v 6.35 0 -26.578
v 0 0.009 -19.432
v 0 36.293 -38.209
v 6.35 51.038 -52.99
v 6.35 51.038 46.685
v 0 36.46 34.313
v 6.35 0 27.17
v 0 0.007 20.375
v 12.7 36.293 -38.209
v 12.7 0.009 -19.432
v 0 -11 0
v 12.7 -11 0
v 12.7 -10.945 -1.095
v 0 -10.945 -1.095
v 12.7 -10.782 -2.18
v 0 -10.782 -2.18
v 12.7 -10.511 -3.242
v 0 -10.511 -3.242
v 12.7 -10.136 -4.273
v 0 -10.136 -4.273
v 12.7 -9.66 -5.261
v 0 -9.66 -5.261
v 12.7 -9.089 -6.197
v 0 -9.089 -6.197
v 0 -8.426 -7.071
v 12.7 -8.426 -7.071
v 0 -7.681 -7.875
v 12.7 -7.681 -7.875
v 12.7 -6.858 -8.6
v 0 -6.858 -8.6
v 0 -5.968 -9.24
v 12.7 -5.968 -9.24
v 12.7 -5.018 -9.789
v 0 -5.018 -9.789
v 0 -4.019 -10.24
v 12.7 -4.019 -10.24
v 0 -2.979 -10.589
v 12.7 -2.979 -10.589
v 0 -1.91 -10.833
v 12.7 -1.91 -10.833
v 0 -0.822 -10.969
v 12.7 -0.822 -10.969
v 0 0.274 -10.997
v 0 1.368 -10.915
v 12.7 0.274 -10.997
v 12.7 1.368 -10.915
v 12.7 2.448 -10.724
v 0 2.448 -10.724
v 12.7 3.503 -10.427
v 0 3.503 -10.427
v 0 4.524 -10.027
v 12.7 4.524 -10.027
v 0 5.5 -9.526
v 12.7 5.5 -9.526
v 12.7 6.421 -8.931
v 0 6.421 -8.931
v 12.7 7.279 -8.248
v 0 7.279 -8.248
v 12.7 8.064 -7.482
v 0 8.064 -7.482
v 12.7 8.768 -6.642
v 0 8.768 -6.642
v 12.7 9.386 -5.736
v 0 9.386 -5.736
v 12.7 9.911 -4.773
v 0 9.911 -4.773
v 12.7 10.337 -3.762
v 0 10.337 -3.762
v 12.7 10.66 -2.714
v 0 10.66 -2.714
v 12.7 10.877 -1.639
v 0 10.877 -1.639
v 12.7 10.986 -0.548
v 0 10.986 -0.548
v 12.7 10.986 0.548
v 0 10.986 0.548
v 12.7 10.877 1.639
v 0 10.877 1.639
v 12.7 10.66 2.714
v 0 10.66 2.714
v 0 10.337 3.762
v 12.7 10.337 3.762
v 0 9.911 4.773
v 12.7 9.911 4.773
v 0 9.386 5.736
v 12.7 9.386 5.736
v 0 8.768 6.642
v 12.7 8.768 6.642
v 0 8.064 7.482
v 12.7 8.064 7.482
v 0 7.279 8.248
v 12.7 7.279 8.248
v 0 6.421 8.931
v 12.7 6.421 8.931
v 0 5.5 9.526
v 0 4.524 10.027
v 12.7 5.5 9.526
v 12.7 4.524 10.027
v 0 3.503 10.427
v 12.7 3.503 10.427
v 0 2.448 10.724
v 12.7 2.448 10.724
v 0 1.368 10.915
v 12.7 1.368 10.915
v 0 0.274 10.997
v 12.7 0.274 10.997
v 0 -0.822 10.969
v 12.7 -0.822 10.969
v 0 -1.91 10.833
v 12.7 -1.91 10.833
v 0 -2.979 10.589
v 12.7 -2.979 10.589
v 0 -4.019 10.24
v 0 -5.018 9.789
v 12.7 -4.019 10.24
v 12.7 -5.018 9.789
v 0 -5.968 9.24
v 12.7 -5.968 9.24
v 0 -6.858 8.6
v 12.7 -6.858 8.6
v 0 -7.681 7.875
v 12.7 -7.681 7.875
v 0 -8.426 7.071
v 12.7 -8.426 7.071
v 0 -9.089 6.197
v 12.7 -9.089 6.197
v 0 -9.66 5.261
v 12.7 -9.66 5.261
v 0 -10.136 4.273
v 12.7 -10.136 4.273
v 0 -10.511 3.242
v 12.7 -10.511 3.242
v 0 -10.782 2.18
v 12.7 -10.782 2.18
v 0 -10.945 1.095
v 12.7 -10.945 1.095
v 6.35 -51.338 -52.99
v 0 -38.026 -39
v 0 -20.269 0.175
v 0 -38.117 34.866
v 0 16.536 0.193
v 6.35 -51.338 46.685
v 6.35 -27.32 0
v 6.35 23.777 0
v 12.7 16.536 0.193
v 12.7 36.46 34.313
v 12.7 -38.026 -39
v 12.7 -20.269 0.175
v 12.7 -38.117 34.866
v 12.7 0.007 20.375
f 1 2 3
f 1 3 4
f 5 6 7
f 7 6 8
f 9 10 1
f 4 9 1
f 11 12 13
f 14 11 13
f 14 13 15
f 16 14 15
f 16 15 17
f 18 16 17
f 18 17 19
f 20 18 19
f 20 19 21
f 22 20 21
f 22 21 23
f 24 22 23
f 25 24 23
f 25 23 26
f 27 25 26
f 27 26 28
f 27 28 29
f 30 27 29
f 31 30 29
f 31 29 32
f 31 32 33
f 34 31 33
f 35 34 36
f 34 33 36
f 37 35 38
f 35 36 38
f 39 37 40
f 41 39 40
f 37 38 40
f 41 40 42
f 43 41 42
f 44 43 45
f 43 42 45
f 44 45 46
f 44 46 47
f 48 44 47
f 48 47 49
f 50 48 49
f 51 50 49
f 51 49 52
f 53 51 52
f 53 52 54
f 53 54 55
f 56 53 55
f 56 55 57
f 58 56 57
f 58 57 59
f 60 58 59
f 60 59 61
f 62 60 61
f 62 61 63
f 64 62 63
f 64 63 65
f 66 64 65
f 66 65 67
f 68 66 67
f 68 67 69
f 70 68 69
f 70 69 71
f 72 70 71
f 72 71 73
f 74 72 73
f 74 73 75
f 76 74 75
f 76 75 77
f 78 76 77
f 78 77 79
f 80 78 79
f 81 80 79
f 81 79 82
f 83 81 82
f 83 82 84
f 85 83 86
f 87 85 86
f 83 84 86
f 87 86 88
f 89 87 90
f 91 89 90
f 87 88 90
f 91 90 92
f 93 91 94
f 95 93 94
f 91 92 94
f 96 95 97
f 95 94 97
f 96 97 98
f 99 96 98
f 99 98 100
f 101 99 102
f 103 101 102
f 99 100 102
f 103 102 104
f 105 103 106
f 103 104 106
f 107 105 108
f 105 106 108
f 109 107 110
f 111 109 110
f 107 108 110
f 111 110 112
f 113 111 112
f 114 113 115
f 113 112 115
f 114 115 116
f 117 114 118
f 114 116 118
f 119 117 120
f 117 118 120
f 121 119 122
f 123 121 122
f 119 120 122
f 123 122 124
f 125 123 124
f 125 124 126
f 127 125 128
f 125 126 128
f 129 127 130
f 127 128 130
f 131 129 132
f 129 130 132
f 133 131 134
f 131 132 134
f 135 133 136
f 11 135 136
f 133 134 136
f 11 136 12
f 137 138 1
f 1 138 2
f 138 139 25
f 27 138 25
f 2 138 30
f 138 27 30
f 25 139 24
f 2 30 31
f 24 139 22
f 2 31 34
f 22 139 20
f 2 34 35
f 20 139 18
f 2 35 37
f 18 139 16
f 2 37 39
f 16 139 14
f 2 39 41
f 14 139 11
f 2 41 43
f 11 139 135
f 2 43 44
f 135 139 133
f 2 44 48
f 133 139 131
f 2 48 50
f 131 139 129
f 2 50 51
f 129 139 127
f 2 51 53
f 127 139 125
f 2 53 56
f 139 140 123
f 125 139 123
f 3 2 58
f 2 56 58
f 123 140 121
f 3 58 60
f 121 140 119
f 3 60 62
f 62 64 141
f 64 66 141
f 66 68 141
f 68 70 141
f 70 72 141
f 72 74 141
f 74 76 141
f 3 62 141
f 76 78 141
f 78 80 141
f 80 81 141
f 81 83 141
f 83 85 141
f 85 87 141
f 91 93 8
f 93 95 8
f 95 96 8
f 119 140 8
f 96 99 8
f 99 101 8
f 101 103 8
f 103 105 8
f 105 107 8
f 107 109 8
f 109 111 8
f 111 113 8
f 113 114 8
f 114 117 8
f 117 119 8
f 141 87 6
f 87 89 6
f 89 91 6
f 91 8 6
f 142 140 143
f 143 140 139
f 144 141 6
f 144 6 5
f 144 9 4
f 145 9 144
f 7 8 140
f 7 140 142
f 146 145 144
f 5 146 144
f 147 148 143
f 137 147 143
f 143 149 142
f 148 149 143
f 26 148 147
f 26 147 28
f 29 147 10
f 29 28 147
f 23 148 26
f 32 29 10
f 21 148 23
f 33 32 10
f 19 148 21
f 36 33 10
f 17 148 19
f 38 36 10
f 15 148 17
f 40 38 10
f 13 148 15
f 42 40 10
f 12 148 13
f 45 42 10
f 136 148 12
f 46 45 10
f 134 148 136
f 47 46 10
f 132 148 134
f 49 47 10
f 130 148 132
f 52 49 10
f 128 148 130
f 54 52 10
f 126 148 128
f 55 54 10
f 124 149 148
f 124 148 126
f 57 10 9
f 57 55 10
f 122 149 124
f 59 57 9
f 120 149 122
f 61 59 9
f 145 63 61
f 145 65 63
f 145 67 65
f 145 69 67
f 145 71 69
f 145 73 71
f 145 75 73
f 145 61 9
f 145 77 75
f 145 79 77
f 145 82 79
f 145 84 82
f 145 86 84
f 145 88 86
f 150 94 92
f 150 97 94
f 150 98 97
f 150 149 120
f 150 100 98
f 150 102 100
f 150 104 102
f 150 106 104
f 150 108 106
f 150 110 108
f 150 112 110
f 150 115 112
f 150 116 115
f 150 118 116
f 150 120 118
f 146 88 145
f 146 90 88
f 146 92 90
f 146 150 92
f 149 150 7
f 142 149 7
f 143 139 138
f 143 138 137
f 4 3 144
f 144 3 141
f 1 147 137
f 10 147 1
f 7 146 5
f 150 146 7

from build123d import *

# Parameters (mm, degrees)
F1_DEPTH = 12.7
F2_SIZE  = 6.34999
F4_D     = 22


# Not quite as in the source:
# - a fillet or chamfer is up to 0.001 mm smaller than in the source, because OpenCascade refuses the exact size


with BuildPart() as f1:
    # F0 (on Right) → F1 (new body)
    with BuildSketch(Plane.YZ):
        Polygon((0, 27.1703749895), (-51.3384975493, 46.6850064695), (-27.3204874247, 0), (0, 0), align=None)
        Polygon((0, 0), (-27.3204874247, 0), (-51.3384975493, -52.9897361994), (0, -26.5776470263), align=None)
        Polygon((23.7766716471, 0), (0, 0), (0, -26.5776470263), (51.0382726789, -52.9897361994), align=None)
        Polygon((51.0382726789, 46.6850064695), (0, 27.1703749895), (0, 0), (23.7766716471, 0), align=None)
    extrude(amount=F1_DEPTH)

    # F2 (size 6.35 in the source; OpenCascade refuses exactly that, so slightly less here)
    f2_edges = [f1.edges().sort_by_distance(p)[0] for p in [
        (12.7, -39.329492, 23.342503),
        (0, -39.329492, 23.342503),
        (0, -25.669249, 36.927691),
        (12.7, -25.669249, 36.927691),
        (0, -39.329492, -26.494868),
        (0, -25.669249, -39.783692),
        (12.7, -25.669249, -39.783692),
        (12.7, -39.329492, -26.494868),
        (0, 25.519136, -39.783692),
        (12.7, 25.519136, -39.783692),
        (0, 37.407472, -26.494868),
        (12.7, 37.407472, -26.494868),
        (0, 37.407472, 23.342503),
        (12.7, 37.407472, 23.342503),
        (0, 25.519136, 36.927691),
        (12.7, 25.519136, 36.927691),
    ]]
    chamfer(f2_edges, length=F2_SIZE)

    # F4 (through all)
    with Locations(Plane(origin=(0, 0, 0), x_dir=(0, 1, 0), z_dir=(-1, 0, 0))):
        with Locations((0, 0)):
            Hole(F4_D / 2)


solid = f1.part
